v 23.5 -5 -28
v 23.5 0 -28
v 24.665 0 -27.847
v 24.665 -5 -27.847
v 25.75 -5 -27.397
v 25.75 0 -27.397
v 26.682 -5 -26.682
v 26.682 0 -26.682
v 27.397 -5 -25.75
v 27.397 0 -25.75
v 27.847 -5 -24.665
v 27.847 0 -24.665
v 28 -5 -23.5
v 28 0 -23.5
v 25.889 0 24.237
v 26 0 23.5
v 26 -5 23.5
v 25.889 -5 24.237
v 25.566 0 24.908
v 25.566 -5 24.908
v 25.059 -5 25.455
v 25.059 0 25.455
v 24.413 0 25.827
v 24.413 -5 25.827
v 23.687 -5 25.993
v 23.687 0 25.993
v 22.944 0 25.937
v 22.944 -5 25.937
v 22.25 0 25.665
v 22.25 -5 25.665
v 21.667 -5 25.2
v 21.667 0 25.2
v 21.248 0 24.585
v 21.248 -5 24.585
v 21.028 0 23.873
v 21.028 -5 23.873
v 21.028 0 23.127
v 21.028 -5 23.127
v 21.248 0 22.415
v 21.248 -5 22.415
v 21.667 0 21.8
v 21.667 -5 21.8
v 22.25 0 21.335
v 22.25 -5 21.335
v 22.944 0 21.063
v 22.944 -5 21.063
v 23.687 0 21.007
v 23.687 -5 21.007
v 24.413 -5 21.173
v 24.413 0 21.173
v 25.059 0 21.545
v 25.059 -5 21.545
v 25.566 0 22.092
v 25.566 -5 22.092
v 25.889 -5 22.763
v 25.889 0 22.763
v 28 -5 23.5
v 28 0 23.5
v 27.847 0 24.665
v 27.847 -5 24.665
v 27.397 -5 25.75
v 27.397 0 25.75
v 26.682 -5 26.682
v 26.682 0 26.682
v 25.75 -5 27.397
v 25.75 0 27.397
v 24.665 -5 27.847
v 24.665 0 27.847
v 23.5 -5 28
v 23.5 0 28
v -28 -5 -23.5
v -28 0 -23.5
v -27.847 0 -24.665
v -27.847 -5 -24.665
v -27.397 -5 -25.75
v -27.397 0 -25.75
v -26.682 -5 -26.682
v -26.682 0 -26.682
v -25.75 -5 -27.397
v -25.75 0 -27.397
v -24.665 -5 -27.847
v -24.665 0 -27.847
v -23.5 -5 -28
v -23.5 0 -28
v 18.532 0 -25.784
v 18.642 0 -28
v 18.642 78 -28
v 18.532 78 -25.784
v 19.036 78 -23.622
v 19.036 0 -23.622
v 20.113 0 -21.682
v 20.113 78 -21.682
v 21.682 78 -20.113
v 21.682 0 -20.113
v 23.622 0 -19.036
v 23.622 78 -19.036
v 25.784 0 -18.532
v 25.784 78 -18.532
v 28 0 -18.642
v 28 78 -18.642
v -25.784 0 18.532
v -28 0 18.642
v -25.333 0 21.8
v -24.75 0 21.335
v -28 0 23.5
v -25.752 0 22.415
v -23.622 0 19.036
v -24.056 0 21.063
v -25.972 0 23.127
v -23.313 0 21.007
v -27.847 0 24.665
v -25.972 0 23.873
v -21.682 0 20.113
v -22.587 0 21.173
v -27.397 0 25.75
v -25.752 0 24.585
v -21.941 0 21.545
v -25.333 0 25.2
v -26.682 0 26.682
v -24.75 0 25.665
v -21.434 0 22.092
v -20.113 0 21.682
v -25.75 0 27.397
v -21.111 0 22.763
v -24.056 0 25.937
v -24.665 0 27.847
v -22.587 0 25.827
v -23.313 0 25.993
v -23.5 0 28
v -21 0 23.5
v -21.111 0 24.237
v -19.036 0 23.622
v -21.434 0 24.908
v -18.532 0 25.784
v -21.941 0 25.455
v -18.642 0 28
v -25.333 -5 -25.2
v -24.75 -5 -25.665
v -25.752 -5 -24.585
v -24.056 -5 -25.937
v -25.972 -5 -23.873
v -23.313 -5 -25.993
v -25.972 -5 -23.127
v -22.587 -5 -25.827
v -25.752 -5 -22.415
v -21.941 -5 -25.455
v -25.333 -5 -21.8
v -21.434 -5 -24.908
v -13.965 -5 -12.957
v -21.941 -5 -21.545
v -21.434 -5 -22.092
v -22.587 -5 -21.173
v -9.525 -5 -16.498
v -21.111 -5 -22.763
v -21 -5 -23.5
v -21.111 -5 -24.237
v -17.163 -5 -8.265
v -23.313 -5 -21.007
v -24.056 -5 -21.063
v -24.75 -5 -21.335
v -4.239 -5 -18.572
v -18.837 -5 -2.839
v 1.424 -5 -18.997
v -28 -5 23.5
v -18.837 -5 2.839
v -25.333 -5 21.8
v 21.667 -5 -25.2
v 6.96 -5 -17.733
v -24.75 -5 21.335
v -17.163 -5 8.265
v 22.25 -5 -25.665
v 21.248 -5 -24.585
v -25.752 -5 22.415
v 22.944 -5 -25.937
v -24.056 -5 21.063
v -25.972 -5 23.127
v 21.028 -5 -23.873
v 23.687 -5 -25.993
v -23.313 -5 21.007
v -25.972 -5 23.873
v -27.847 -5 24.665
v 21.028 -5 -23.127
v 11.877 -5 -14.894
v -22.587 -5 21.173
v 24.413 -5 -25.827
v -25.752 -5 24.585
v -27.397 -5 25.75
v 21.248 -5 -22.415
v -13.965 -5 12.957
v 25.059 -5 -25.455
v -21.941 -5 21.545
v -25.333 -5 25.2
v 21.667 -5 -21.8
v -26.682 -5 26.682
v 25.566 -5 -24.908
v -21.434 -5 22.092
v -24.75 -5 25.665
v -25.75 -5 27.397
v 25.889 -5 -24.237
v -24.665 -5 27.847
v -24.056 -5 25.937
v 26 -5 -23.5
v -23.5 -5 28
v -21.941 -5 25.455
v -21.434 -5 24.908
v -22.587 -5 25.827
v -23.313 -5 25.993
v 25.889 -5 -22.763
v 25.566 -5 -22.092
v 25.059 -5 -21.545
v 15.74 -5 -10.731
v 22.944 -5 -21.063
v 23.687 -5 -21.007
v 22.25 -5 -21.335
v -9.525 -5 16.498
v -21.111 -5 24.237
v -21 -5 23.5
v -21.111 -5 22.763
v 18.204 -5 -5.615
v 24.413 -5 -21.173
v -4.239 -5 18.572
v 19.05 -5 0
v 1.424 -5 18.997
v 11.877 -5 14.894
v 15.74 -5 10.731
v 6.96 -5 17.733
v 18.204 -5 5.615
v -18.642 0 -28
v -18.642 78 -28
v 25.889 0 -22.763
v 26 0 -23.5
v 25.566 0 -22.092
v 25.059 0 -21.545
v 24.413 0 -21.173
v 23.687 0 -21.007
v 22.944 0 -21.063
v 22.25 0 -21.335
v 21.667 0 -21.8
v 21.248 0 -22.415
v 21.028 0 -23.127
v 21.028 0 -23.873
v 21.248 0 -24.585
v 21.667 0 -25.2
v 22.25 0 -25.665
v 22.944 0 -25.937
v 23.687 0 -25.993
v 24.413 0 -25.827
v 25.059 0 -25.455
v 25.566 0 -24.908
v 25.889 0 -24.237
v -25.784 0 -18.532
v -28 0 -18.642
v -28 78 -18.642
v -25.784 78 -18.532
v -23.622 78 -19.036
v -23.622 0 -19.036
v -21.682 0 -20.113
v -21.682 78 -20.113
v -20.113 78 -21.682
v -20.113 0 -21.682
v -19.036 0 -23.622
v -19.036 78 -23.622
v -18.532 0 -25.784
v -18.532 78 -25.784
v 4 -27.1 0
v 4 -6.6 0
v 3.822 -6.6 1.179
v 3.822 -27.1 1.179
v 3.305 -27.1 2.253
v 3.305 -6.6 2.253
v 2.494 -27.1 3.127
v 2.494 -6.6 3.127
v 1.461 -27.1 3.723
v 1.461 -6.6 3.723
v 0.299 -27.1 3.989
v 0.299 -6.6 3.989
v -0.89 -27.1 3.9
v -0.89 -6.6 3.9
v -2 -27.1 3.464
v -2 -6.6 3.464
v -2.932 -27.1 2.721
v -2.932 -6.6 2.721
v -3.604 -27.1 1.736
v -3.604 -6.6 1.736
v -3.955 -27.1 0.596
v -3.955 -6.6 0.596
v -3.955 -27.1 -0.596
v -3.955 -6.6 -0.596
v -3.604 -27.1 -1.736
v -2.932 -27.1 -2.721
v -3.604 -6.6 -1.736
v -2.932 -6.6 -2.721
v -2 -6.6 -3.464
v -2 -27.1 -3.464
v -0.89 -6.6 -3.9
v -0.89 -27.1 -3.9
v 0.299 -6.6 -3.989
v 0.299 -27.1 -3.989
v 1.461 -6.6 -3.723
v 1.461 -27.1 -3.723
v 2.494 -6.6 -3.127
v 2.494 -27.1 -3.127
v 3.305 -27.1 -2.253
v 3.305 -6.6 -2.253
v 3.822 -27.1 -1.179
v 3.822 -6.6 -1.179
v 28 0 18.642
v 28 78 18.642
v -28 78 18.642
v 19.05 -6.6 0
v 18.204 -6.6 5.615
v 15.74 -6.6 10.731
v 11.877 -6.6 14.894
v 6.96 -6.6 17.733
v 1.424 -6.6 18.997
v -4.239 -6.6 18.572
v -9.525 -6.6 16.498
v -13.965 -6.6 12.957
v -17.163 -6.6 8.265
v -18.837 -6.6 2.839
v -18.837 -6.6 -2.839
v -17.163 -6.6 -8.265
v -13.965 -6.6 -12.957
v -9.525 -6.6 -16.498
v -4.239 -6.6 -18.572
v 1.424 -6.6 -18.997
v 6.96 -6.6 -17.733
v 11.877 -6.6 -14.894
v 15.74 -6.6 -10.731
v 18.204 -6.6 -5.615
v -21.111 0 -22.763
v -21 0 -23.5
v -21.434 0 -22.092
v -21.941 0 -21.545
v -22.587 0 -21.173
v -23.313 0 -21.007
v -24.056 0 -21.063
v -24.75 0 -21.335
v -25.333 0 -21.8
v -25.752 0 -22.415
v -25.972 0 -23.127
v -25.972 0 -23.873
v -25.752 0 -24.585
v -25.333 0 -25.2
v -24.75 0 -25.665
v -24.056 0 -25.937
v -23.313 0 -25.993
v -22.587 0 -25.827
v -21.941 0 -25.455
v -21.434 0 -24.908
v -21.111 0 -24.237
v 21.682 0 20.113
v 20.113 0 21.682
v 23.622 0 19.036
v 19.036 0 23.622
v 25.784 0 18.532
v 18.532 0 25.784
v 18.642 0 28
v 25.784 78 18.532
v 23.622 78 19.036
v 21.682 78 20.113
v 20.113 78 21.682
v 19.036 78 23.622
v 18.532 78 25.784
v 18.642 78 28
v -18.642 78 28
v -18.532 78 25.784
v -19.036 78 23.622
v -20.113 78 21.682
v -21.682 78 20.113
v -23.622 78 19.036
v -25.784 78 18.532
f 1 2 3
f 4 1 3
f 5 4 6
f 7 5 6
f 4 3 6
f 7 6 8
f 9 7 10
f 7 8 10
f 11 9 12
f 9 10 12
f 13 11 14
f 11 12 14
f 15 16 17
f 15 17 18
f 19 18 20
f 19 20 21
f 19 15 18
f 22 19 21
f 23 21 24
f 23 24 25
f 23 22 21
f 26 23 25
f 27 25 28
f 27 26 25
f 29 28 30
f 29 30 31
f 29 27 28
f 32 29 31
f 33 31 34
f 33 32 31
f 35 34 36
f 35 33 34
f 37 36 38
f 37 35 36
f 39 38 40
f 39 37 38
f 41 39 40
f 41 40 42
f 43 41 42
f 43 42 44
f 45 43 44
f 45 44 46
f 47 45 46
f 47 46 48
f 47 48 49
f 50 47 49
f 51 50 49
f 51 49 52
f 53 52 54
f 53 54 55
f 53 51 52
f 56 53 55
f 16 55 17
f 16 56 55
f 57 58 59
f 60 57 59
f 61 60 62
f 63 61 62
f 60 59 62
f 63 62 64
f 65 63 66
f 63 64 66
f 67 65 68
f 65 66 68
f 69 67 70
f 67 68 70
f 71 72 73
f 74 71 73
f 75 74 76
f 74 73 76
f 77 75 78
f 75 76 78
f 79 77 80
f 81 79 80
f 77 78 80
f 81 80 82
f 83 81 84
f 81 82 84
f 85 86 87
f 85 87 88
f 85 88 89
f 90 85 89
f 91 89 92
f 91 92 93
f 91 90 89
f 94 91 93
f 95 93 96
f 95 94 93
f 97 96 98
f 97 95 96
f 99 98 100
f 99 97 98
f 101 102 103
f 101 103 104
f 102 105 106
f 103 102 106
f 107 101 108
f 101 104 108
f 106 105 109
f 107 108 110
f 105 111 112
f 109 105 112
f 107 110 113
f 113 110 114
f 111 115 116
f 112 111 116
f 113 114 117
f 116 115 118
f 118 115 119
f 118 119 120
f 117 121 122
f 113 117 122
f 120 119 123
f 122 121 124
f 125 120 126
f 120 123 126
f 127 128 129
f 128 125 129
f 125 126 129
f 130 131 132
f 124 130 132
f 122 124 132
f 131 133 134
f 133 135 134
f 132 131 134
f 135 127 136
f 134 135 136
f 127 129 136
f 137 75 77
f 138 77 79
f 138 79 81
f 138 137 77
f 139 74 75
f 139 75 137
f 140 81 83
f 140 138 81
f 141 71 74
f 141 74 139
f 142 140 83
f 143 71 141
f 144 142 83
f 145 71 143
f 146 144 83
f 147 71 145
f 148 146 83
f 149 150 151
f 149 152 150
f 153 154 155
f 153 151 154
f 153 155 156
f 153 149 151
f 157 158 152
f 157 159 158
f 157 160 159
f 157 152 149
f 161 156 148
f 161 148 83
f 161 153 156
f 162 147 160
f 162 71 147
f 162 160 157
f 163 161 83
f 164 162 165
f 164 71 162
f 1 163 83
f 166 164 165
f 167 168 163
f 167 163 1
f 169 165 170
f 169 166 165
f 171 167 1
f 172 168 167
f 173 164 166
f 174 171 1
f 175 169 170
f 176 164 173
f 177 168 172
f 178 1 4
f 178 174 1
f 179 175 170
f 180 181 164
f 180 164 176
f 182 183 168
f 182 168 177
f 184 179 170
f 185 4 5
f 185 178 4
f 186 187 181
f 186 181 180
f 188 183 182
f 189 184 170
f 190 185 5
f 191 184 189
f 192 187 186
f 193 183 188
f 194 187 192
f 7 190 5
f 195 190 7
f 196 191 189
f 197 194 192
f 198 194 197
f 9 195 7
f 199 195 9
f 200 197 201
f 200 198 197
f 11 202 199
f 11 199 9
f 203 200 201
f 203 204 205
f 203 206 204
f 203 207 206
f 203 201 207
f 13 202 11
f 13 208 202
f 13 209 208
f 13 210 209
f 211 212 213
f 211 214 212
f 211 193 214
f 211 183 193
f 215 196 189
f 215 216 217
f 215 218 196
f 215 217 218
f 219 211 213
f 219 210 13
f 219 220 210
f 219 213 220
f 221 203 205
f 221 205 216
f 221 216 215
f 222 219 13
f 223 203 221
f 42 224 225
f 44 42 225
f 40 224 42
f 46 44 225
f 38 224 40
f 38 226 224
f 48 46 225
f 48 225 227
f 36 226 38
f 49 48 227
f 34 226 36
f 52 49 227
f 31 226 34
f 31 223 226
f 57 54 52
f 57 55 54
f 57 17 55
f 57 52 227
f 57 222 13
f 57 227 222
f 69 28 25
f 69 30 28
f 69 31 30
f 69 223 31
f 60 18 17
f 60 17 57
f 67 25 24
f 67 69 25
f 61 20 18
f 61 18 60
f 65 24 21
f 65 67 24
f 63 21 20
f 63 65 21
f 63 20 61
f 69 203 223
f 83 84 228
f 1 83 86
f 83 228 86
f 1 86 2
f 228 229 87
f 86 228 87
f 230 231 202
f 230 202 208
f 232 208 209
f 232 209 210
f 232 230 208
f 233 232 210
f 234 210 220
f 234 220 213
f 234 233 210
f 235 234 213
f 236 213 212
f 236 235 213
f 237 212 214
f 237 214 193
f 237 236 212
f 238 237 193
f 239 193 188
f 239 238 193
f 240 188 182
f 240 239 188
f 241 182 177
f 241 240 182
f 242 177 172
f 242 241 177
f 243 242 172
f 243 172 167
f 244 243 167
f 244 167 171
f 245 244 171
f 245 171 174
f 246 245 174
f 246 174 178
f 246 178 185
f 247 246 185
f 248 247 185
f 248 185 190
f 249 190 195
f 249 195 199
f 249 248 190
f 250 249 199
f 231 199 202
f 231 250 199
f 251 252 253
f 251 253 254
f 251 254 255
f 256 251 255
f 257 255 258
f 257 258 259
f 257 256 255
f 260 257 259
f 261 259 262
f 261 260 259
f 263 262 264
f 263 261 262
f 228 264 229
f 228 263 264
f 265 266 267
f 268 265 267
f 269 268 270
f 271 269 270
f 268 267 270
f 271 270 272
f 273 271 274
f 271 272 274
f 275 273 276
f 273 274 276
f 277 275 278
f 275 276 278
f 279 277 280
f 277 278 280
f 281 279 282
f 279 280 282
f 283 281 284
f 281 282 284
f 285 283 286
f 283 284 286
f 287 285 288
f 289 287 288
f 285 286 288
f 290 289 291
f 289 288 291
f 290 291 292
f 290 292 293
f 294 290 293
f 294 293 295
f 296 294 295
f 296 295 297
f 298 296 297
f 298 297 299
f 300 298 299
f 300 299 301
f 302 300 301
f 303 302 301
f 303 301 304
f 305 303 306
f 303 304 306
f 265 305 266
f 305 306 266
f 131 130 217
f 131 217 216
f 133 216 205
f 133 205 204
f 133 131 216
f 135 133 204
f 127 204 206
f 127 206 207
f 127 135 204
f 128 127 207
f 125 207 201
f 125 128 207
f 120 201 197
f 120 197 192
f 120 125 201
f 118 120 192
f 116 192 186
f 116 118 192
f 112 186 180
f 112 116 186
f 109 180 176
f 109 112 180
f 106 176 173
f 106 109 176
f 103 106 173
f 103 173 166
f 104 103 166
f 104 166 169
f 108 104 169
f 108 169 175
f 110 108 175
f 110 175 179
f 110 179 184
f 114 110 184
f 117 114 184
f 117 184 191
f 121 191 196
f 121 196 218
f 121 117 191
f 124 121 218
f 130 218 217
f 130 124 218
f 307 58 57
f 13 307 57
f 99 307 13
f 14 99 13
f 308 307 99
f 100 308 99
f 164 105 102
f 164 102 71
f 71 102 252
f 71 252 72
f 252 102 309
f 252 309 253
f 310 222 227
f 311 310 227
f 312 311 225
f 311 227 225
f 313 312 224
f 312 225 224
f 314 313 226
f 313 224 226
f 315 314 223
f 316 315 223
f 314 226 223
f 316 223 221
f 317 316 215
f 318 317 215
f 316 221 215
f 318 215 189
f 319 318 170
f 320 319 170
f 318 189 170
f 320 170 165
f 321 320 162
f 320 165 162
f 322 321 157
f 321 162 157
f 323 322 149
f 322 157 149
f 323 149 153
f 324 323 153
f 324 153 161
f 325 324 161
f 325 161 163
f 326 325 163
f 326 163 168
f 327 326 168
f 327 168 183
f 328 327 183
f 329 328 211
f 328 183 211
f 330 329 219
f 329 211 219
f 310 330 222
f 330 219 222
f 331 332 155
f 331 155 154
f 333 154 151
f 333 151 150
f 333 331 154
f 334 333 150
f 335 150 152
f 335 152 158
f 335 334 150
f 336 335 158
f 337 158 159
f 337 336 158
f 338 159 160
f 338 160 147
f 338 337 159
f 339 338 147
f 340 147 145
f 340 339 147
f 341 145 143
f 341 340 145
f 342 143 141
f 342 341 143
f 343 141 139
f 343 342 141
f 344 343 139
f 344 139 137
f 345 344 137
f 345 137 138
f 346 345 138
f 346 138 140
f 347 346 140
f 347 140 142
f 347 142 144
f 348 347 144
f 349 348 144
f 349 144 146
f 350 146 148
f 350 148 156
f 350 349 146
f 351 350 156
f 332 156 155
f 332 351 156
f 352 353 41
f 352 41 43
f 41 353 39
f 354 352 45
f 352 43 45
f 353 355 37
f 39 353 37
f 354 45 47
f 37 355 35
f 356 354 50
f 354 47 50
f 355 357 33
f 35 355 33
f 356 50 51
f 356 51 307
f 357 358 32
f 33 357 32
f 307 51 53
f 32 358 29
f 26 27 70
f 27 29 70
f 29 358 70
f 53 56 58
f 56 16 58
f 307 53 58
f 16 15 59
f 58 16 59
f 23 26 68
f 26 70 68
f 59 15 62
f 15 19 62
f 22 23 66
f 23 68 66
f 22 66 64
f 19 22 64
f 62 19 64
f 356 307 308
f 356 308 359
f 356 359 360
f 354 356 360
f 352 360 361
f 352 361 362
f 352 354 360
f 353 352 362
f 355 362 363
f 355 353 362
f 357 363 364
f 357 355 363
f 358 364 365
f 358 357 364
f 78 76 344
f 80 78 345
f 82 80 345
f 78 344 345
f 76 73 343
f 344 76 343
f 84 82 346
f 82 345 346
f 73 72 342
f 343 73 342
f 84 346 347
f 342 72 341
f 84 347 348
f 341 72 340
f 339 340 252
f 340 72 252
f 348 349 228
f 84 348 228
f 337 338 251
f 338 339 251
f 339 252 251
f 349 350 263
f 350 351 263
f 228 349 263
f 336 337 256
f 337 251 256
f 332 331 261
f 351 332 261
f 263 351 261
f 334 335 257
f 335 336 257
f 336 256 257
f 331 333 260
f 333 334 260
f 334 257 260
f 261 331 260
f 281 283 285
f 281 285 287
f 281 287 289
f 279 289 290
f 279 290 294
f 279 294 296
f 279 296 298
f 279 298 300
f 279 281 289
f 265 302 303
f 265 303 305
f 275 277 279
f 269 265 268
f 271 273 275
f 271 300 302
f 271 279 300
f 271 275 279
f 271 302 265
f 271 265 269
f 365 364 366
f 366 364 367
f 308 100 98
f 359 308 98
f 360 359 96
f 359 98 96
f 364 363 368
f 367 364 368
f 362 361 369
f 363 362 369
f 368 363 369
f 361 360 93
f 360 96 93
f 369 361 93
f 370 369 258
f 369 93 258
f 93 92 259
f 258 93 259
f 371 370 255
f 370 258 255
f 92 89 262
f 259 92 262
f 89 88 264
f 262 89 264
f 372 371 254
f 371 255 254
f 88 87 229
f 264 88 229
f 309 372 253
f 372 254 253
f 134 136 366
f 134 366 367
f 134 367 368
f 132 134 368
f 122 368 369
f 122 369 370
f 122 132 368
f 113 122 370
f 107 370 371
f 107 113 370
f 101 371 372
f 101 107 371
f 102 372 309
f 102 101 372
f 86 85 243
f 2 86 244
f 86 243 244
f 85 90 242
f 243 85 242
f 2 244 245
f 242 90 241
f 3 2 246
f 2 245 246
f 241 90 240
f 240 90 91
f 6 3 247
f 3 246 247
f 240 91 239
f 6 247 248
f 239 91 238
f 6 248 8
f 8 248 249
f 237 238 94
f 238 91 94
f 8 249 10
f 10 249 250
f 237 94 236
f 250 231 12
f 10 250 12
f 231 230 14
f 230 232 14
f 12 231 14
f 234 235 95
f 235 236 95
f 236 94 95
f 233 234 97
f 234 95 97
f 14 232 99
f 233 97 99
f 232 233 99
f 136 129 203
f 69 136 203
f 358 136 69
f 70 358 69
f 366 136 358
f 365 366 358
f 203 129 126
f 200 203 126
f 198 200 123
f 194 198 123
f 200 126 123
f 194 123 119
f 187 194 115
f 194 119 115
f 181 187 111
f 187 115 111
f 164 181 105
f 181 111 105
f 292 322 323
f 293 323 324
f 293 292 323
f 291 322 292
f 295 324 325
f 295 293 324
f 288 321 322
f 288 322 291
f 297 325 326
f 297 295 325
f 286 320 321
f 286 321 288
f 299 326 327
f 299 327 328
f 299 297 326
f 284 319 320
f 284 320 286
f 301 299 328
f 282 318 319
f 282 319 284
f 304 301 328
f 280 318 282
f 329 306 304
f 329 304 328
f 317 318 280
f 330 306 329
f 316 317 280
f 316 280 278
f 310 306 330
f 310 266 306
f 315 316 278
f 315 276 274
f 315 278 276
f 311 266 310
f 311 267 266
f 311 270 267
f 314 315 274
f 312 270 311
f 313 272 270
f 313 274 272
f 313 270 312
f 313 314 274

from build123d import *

# Parameters (mm, degrees)
SKETCH_R     = 2.5
PAD_DEPTH    = 5
SKETCH001_R  = 19.05
PAD001_DEPTH = 1.6
SKETCH002_R  = 4
PAD002_DEPTH = 20.5
PAD003_DEPTH = 78


with BuildPart() as part:
    # Sketch → Pad (new body)
    with BuildSketch(Plane.XZ):
        with BuildLine():
            Line((-28, 23.499995), (-28, -23.499995))
            ThreePointArc((-28, -23.499995), (-26.681977, -26.681984), (-23.499985, -28))
            Line((-23.499985, -28), (23.500005, -28))
            ThreePointArc((23.500005, -28), (26.681984, -26.681977), (28, -23.499995))
            Line((28, 23.499995), (28, -23.499995))
            ThreePointArc((28, 23.499995), (26.681981, 26.681981), (23.499995, 28))
            Line((-23.499995, 28), (23.499995, 28))
            ThreePointArc((-23.499995, 28), (-26.681981, 26.681981), (-28, 23.499995))
        make_face()
        with Locations((-23.5, 23.5)):
            Circle(SKETCH_R, mode=Mode.SUBTRACT)
        with Locations((23.5, 23.5)):
            Circle(SKETCH_R, mode=Mode.SUBTRACT)
        with Locations((-23.5, -23.5)):
            Circle(SKETCH_R, mode=Mode.SUBTRACT)
        with Locations((23.5, -23.5)):
            Circle(SKETCH_R, mode=Mode.SUBTRACT)
    extrude(amount=PAD_DEPTH)

    # Sketch001 (on Face14 of Pad) → Pad001 (join)
    with BuildSketch(Plane.XZ.offset(5)):
        Circle(SKETCH001_R)
    extrude(amount=PAD001_DEPTH)

    # Sketch002 (on Face16 of Pad001) → Pad002 (join)
    with BuildSketch(Plane.XZ.offset(6.6)):
        Circle(SKETCH002_R)
    extrude(amount=PAD002_DEPTH)

    # Sketch003 (on Face4 of Pad002) → Pad003 (join)
    with BuildSketch(Plane(origin=(0, 0, 0), x_dir=(1, 0, 0), z_dir=(0, 1, 0))):
        with BuildLine():
            Line((-18.641883, 28), (18.641883, 28))
            ThreePointArc((18.641883, 28), (20.843146, 20.843146), (28, 18.641883))
            Line((28, 18.641883), (28, -18.641883))
            ThreePointArc((28, -18.641883), (20.843146, -20.843146), (18.641883, -28))
            Line((-18.641883, -28), (18.641883, -28))
            ThreePointArc((-18.641883, -28), (-20.843146, -20.843146), (-28, -18.641883))
            Line((-28, -18.641883), (-28, 18.641883))
            ThreePointArc((-28, 18.641883), (-20.843146, 20.843146), (-18.641883, 28))
        make_face()
    extrude(amount=PAD003_DEPTH)


solid = part.part
